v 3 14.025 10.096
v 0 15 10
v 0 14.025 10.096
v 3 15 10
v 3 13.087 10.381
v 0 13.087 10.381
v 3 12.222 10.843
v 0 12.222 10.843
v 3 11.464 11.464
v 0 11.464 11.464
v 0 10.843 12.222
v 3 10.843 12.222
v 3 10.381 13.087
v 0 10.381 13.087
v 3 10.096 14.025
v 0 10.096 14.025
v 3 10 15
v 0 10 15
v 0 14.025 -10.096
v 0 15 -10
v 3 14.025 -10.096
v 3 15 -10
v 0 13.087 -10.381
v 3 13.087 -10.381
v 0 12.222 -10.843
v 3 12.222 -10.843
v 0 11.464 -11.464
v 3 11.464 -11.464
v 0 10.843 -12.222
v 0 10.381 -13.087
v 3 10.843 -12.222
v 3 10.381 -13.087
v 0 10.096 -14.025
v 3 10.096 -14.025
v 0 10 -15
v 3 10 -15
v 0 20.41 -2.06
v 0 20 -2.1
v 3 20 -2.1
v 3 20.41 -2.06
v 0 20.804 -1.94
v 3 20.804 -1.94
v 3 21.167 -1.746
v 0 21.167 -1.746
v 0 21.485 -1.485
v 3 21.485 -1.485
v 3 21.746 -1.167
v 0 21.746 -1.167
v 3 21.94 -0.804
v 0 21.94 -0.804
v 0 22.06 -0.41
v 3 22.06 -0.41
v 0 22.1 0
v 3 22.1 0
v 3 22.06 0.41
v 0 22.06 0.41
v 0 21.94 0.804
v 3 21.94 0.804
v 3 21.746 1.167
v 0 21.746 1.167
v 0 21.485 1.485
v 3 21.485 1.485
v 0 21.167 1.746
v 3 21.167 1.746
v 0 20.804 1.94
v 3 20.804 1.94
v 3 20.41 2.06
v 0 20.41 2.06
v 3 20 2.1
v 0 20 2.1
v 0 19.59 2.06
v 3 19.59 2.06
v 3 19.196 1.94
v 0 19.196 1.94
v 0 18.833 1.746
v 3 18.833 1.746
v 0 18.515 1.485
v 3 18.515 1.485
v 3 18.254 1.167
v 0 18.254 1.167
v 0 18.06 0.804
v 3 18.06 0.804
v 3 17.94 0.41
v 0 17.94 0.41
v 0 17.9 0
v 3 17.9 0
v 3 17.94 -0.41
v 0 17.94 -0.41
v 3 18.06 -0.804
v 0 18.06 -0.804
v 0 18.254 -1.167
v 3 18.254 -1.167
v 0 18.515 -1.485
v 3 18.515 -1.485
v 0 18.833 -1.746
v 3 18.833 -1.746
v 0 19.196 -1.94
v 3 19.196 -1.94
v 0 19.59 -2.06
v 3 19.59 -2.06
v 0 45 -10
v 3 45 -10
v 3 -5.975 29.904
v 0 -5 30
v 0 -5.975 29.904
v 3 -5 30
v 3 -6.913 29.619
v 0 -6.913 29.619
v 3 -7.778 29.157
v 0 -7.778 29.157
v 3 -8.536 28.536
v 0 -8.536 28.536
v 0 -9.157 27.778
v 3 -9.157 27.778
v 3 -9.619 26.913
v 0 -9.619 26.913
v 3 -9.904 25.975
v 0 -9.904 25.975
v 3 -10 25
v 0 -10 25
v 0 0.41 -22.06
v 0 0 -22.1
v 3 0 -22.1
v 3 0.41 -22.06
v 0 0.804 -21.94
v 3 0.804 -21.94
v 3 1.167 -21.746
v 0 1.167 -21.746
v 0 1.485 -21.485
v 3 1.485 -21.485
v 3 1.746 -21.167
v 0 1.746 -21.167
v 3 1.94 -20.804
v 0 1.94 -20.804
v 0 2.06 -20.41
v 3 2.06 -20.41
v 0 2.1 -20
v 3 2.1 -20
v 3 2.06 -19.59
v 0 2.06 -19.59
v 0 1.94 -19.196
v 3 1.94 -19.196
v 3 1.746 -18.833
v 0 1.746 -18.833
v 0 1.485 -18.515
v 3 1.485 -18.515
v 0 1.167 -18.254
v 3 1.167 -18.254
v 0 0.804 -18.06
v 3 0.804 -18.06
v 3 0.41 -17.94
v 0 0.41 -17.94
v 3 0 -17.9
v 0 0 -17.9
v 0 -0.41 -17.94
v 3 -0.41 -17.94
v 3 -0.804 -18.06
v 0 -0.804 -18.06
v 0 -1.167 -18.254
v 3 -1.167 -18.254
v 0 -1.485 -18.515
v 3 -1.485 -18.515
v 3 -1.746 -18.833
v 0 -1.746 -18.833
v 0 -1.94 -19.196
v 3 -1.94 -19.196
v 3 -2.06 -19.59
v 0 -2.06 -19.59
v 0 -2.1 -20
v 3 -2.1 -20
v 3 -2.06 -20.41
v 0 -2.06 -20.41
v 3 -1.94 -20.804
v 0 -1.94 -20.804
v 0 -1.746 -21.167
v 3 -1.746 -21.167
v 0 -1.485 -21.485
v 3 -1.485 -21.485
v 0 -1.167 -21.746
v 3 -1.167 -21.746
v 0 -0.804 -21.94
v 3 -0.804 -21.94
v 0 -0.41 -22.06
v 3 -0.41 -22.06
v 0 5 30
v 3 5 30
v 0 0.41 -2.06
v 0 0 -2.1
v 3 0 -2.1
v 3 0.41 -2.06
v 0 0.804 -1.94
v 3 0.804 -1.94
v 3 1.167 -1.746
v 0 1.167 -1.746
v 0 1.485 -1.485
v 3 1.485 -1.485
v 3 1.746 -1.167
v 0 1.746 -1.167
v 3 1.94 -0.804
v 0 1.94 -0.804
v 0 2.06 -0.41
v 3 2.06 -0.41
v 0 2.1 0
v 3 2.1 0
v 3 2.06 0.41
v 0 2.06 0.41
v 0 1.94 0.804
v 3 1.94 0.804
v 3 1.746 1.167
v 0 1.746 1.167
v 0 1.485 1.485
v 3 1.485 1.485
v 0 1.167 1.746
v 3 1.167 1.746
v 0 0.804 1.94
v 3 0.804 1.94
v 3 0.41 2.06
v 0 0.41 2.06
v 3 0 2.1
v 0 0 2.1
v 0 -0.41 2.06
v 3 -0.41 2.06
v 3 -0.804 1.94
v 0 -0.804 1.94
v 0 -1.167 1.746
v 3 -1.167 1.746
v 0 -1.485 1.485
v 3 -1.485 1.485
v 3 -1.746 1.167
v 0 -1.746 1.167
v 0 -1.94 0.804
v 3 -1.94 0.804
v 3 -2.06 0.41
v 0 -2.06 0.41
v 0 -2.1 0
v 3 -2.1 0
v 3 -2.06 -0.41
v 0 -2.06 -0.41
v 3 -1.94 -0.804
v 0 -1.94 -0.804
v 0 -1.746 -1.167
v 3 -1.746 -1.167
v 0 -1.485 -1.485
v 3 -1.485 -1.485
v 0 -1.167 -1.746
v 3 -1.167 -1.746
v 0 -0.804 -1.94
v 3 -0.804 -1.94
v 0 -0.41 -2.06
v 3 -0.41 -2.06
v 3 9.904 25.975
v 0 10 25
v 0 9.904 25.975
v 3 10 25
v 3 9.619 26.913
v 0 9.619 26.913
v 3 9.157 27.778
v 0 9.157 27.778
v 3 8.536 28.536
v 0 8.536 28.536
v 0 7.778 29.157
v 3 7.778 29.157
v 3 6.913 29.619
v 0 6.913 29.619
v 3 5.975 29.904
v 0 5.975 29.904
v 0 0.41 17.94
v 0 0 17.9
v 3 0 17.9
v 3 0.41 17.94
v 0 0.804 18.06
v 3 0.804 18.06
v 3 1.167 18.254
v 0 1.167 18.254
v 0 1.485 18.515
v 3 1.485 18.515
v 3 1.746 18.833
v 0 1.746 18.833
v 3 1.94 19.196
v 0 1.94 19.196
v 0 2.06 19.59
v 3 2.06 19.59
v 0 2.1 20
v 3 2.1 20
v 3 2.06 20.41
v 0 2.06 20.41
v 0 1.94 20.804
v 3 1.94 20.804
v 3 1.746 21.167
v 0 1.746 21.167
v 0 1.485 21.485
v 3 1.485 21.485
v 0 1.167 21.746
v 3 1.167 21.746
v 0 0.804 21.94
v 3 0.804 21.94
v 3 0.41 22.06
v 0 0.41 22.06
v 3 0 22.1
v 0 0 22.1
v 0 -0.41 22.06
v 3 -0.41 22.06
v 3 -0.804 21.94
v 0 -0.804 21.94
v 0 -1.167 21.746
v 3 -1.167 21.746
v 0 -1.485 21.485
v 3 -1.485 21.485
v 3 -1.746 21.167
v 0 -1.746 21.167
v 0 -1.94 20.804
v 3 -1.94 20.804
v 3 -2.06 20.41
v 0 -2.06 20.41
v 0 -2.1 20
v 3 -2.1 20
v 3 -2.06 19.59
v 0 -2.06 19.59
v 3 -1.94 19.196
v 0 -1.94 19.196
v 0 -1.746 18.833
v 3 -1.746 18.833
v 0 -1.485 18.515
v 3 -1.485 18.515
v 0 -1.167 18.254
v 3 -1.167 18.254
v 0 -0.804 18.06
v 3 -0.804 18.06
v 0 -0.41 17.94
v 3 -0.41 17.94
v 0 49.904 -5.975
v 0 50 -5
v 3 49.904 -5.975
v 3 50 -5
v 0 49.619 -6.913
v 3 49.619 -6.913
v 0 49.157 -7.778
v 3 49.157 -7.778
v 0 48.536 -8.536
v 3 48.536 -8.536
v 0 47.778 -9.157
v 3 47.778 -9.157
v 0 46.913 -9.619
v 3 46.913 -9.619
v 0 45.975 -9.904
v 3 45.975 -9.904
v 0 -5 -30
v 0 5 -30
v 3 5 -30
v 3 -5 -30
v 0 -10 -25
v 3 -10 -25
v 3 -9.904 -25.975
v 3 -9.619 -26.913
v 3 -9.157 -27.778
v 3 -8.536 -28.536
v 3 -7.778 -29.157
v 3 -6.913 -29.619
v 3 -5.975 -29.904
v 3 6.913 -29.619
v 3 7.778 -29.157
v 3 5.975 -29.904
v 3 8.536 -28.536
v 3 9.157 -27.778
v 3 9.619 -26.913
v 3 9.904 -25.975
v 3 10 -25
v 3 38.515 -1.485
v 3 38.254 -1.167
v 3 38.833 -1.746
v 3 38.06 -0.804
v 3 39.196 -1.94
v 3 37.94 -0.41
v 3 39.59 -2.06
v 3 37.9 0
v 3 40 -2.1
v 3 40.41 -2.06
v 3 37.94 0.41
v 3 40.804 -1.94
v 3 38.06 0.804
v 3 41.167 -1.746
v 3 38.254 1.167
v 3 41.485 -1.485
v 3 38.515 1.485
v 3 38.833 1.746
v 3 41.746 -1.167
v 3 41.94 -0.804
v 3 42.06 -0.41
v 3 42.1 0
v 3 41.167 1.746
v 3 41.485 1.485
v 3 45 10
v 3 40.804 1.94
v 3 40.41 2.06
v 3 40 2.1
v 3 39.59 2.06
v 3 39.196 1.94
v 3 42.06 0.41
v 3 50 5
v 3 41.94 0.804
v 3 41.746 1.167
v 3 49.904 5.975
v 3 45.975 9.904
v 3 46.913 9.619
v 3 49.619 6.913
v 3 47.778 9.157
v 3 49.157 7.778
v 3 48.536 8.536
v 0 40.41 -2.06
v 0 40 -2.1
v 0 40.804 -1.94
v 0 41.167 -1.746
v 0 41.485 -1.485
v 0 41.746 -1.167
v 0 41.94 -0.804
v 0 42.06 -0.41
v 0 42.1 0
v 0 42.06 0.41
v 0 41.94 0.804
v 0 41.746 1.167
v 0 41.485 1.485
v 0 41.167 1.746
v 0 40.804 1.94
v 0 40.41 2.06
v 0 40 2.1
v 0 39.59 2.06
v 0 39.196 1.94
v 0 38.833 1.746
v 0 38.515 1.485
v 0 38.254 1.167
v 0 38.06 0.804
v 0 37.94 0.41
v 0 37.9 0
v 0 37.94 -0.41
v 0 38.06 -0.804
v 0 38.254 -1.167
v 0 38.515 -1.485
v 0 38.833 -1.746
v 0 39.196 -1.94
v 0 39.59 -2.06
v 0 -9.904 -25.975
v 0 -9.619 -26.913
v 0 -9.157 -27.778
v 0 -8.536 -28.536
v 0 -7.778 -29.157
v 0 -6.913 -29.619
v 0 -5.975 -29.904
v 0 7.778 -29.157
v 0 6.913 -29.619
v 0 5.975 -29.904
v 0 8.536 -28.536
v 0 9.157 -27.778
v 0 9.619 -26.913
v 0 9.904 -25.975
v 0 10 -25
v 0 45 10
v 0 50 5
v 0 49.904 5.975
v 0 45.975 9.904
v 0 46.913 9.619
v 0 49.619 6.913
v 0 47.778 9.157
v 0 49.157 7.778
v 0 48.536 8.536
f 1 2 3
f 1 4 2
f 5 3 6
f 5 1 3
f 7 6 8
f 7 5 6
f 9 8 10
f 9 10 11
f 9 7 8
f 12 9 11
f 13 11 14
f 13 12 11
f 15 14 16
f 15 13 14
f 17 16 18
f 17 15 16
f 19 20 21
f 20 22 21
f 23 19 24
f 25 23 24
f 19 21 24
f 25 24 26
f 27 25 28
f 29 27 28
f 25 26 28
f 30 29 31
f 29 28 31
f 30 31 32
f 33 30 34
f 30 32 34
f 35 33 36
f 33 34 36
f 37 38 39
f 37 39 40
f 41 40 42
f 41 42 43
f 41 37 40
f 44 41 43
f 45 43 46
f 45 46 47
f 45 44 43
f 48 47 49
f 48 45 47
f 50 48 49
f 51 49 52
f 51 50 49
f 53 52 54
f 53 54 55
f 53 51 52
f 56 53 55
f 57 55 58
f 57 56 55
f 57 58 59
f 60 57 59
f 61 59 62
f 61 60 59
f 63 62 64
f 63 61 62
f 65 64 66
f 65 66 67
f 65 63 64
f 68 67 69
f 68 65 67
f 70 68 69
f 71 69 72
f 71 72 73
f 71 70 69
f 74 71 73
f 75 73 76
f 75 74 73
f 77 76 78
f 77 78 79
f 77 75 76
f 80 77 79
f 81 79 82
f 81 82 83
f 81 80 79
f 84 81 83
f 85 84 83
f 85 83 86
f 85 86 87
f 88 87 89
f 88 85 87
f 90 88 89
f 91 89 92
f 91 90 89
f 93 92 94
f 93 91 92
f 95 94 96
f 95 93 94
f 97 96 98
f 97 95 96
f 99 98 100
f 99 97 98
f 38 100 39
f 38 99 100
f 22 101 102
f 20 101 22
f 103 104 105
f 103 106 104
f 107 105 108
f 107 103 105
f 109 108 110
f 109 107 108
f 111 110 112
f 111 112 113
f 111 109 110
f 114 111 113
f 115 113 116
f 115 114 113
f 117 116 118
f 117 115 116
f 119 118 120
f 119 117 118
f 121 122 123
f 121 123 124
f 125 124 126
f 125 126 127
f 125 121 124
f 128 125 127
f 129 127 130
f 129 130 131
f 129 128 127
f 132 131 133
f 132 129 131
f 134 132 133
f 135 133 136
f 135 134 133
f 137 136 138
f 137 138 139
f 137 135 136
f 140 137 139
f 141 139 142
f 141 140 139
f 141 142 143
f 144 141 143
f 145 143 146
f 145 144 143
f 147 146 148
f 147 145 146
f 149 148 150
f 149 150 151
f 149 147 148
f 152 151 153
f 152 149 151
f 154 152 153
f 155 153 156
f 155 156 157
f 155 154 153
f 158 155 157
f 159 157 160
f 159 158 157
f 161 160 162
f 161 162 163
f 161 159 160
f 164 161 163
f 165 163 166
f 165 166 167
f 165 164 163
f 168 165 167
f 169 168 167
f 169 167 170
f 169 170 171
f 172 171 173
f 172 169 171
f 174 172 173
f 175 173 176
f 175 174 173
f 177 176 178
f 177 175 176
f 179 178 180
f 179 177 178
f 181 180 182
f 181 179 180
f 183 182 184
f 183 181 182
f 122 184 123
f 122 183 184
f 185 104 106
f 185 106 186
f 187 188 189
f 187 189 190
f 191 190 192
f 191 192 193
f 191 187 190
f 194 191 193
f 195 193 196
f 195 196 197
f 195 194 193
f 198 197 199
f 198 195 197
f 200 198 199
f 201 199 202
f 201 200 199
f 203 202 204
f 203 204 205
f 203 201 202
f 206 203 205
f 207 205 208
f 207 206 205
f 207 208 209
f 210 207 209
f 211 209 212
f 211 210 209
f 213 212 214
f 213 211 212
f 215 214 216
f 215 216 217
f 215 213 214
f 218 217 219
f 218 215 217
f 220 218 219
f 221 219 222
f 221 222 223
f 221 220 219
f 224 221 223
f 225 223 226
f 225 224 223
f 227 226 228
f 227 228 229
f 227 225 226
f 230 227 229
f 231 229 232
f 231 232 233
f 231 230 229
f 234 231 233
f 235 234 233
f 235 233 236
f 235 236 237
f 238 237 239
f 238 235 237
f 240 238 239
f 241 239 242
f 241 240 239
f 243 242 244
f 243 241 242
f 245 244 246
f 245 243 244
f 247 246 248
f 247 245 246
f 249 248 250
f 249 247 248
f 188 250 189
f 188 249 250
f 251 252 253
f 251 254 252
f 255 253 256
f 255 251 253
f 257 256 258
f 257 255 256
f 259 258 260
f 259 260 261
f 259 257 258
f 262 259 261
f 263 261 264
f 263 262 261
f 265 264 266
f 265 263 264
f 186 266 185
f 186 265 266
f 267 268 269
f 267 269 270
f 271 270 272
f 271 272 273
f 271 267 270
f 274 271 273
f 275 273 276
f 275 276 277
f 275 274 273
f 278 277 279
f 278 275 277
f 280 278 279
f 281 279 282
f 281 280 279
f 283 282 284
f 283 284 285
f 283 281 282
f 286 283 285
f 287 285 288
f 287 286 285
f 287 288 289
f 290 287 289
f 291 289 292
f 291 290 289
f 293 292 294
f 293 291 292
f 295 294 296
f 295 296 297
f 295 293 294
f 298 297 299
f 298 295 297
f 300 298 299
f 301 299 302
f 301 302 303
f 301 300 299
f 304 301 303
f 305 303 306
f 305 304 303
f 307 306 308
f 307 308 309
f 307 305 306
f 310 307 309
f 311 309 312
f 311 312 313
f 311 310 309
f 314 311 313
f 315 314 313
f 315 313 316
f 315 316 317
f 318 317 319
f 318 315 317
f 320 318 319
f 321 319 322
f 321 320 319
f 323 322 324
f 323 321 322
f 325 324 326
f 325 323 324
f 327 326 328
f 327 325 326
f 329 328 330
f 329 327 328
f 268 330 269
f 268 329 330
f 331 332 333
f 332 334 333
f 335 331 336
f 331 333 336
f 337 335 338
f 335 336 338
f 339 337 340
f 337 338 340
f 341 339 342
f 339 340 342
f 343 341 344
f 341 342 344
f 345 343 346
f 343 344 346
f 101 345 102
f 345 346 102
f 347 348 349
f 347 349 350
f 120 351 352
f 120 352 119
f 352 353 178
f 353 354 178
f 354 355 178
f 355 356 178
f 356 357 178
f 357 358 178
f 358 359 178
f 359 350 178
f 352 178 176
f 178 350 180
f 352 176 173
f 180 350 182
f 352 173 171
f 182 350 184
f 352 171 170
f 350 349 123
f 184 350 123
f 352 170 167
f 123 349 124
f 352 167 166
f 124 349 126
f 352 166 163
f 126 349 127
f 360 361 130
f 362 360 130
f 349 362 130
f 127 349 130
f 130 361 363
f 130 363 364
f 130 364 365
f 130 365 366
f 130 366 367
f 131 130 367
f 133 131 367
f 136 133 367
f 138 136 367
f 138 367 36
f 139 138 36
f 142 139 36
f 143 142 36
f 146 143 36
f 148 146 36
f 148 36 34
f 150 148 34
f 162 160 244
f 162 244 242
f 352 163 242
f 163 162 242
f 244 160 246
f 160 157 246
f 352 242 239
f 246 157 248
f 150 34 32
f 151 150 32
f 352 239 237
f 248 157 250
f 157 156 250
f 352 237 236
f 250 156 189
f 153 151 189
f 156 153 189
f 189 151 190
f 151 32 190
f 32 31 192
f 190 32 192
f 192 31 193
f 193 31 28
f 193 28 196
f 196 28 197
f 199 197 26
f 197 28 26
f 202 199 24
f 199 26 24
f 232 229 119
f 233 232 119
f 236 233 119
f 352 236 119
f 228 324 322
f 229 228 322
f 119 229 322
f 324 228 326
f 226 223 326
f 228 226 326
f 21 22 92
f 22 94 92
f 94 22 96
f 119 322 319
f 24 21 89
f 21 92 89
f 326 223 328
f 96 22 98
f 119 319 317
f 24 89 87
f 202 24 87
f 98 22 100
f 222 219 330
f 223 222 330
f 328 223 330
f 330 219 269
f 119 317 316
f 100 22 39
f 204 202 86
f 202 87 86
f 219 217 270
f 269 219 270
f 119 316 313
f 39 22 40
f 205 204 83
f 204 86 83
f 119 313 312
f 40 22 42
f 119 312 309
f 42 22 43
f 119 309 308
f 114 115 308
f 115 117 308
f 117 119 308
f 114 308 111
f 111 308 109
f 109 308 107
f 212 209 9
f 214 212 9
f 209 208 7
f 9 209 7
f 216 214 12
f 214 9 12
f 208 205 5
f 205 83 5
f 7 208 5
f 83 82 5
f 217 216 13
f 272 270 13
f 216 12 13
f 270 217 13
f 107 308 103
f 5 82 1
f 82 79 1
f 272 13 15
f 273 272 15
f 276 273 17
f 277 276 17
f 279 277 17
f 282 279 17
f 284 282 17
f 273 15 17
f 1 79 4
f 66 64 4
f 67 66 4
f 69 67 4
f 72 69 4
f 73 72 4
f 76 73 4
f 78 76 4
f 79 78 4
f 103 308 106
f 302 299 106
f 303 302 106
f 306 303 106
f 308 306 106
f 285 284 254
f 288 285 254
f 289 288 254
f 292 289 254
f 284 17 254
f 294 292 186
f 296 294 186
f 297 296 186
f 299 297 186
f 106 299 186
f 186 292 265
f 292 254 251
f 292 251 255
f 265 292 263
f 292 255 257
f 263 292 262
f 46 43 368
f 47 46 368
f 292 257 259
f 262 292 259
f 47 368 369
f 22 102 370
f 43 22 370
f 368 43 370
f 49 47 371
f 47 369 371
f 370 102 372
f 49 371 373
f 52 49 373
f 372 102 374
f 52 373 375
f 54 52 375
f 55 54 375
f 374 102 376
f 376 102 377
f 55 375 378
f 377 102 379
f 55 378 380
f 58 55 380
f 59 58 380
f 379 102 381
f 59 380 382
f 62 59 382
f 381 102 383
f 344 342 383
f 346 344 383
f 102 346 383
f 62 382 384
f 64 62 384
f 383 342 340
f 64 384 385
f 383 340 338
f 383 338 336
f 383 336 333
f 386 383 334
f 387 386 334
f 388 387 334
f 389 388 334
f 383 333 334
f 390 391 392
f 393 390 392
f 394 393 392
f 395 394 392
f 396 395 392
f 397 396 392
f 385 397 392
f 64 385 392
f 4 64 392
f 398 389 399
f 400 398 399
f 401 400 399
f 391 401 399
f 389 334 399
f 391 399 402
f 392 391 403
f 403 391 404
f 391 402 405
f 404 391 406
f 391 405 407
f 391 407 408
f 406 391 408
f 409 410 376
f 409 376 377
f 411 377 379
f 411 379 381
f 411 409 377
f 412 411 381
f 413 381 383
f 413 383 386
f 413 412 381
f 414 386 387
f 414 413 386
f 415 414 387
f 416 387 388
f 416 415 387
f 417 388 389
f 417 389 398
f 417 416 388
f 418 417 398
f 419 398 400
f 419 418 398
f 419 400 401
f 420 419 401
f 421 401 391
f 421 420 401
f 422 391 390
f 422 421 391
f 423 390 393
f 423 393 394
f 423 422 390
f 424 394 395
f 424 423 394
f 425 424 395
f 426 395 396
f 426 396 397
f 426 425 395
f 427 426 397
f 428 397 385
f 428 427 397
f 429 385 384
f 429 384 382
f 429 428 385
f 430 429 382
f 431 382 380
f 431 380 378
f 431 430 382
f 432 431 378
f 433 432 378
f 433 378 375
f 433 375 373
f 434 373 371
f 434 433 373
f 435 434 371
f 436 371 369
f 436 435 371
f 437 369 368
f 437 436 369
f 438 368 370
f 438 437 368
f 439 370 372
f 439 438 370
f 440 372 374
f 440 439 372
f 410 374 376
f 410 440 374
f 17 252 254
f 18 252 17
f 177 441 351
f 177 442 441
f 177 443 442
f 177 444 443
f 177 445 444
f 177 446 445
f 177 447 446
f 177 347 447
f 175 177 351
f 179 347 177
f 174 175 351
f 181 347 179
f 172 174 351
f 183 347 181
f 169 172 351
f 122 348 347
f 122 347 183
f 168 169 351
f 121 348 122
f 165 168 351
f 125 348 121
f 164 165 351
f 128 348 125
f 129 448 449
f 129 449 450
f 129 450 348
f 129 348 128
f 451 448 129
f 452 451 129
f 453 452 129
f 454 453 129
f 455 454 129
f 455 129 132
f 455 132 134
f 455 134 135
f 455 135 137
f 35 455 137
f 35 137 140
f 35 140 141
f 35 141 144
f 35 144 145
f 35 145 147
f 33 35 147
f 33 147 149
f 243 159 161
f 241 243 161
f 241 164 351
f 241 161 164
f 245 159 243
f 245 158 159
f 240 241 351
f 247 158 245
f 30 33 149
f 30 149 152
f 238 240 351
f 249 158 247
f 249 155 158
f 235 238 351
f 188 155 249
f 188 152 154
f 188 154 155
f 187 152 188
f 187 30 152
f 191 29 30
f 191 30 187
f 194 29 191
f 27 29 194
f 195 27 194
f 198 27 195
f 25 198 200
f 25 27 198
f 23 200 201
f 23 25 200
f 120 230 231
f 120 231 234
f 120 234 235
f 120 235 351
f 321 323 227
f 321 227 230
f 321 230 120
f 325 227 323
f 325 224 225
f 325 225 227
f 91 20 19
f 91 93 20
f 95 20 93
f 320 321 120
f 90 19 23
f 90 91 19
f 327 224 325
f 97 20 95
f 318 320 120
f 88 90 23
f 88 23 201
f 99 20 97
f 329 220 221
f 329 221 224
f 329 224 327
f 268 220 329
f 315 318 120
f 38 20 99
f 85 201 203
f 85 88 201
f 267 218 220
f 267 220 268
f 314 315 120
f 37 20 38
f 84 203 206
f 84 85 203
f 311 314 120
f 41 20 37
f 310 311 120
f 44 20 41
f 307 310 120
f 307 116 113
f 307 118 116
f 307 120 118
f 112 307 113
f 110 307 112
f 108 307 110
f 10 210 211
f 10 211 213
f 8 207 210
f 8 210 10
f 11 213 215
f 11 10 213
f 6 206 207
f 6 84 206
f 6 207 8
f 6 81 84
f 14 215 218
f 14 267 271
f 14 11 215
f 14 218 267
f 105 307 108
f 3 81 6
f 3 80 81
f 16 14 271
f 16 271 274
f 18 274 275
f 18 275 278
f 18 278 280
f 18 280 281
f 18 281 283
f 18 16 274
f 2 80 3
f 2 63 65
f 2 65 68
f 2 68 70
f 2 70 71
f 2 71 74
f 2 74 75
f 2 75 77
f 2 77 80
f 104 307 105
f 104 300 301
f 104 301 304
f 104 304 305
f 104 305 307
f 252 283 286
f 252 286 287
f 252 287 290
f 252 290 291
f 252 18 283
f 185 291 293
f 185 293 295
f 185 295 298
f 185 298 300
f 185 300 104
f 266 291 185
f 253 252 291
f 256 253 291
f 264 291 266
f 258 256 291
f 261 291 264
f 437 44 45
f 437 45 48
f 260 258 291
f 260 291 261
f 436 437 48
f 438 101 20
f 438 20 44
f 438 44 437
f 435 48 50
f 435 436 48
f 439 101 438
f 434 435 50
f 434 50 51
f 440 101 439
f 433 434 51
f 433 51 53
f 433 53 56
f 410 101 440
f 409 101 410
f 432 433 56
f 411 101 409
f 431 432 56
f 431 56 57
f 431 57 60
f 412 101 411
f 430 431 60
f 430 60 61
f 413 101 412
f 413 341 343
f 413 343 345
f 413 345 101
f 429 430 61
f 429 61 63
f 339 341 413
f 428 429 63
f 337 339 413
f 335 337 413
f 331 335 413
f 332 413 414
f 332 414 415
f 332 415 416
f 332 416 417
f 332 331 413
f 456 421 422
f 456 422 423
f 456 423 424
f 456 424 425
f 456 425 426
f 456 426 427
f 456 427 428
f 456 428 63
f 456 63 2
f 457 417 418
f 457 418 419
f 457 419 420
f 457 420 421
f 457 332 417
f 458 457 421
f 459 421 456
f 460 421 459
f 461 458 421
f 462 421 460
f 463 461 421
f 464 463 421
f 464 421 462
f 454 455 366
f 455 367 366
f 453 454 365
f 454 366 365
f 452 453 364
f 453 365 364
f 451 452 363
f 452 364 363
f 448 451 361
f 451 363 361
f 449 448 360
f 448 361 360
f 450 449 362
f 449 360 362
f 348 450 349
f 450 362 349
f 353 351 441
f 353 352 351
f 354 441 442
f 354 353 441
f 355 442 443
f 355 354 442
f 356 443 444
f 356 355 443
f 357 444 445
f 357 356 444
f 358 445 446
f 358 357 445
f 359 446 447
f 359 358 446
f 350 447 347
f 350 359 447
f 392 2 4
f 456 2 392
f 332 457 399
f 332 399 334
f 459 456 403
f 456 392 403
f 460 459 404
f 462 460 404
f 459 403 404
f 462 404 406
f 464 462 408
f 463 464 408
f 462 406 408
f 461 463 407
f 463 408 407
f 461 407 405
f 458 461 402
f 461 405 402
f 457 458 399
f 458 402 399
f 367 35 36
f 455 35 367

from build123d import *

# Parameters (mm, degrees)
SKETCH_1_R      = 2.1
EXTRUDE_1_DEPTH = 3
FILLET_1_R      = 5


with BuildPart() as part:
    # 草图1 → 凸台-拉伸1 (new body)
    with BuildSketch(Plane(origin=(0, 0, 0), x_dir=(0, 0, -1), z_dir=(1, 0, 0))):
        Polygon((-10, 10), (-10, 50), (10, 50), (10, 10), (30, 10), (30, -10), (-30, -10), (-30, 10), align=None)
        with Locations((-20, 0)):
            Circle(SKETCH_1_R, mode=Mode.SUBTRACT)
        Circle(SKETCH_1_R, mode=Mode.SUBTRACT)
        with Locations((20, 0)):
            Circle(SKETCH_1_R, mode=Mode.SUBTRACT)
        with Locations((0, 20)):
            Circle(SKETCH_1_R, mode=Mode.SUBTRACT)
        with Locations((0, 40)):
            Circle(SKETCH_1_R, mode=Mode.SUBTRACT)
    extrude(amount=EXTRUDE_1_DEPTH)

    # 圆角1
    fillet_1_edges = [part.edges().sort_by_distance(p)[0] for p in [
        (1.5, -10, -30),
        (1.5, -10, 30),
        (1.5, 10, 30),
        (1.5, 10, 10),
        (1.5, 50, 10),
        (1.5, 50, -10),
        (1.5, 10, -10),
        (1.5, 10, -30),
    ]]
    fillet(fillet_1_edges, radius=FILLET_1_R)


solid = part.part
